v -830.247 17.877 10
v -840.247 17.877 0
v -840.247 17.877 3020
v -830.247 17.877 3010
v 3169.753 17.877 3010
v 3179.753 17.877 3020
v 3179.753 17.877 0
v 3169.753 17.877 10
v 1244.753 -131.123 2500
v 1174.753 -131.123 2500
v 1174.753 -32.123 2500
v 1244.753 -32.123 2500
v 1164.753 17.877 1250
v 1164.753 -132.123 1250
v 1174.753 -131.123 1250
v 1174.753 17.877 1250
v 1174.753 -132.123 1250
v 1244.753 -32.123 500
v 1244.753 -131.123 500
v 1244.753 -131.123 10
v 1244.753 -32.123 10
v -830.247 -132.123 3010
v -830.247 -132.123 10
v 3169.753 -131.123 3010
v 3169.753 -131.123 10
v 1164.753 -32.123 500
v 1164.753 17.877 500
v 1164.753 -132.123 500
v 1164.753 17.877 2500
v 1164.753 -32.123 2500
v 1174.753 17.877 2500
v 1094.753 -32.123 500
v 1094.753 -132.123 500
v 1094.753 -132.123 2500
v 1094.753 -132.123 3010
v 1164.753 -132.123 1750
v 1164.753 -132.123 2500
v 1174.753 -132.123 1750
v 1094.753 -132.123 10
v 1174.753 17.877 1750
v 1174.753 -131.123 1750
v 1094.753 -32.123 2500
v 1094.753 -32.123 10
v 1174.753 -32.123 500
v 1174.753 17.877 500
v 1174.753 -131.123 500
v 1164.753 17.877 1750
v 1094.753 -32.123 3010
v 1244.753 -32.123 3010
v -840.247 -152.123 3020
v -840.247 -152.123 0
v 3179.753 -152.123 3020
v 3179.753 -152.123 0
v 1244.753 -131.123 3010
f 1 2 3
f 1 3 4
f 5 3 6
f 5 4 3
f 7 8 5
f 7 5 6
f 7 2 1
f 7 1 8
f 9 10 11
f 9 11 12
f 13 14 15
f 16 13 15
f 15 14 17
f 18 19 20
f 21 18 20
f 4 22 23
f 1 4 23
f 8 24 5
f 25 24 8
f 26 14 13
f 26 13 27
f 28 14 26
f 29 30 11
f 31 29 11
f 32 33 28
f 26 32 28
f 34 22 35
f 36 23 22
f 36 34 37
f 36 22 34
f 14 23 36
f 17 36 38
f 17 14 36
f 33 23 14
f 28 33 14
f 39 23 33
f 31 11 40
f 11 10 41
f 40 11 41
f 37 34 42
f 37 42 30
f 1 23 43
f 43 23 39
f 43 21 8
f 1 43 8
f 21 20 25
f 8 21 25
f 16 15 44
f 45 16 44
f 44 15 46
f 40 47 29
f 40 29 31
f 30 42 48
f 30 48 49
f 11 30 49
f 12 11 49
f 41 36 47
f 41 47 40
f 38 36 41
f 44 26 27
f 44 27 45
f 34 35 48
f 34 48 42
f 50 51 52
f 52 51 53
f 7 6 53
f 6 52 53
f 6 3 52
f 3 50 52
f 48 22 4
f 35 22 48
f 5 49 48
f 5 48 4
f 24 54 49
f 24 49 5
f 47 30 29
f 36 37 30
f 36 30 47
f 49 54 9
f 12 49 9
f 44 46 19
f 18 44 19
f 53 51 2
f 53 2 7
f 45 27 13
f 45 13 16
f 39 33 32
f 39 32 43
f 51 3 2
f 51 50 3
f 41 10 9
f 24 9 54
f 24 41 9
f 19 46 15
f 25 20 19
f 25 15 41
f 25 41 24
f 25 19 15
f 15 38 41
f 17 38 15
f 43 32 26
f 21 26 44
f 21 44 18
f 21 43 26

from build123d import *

# Parameters (mm, degrees)
ESBO_O1_W                = 4020
ESBO_O1_H                = 20
RESSALTO_EXTRUS_O1_DEPTH = 3020
ESBO_O2_W                = 4020
ESBO_O2_H                = 3020
ESBO_O2_W_2              = 4000
ESBO_O2_H_2              = 3000
ESBO_O2_W_3              = 10
ESBO_O2_H_3              = 750
RESSALTO_EXTRUS_O2_DEPTH = 150
ESBO_O3_W                = 150
ESBO_O3_H                = 490
ESBO_O3_H_2              = 510
RESSALTO_EXTRUS_O3_DEPTH = 100
ESBO_O4_W                = 1995
ESBO_O4_H                = 3000
RESSALTO_EXTRUS_O4_DEPTH = 1


with BuildPart() as part:
    # Esboço1 → Ressalto-extrusão1 (new body)
    with BuildSketch(Plane.XY):
        with Locations((1169.753435213, -142.12327558)):
            Rectangle(ESBO_O1_W, ESBO_O1_H)
    extrude(amount=RESSALTO_EXTRUS_O1_DEPTH)

    # Esboço2 → Ressalto-extrusão2 (add)
    with BuildSketch(Plane(origin=(0, -132.12327558, 0), x_dir=(1, 0, 0), z_dir=(0, 1, 0))):
        with Locations((1169.753435213, -1510)):
            Rectangle(ESBO_O2_W, ESBO_O2_H)
        with Locations((1169.753435213, -1510)):
            Rectangle(ESBO_O2_W_2, ESBO_O2_H_2, mode=Mode.SUBTRACT)
        with Locations((1169.753435213, -875)):
            Rectangle(ESBO_O2_W_3, ESBO_O2_H_3)
        with Locations((1169.753435213, -2125)):
            Rectangle(ESBO_O2_W_3, ESBO_O2_H_3)
    extrude(amount=RESSALTO_EXTRUS_O2_DEPTH)

    # Esboço3 → Ressalto-extrusão3 (add)
    with BuildSketch(Plane(origin=(0, -132.12327558, 0), x_dir=(1, 0, 0), z_dir=(0, 1, 0))):
        with Locations((1169.753435213, -255)):
            Rectangle(ESBO_O3_W, ESBO_O3_H)
        with Locations((1169.753435213, -2755)):
            Rectangle(ESBO_O3_W, ESBO_O3_H_2)
    extrude(amount=RESSALTO_EXTRUS_O3_DEPTH)

    # Esboço4 → Ressalto-extrusão4 (add)
    with BuildSketch(Plane(origin=(0, -132.12327558, 0), x_dir=(1, 0, 0), z_dir=(0, 1, 0))):
        with Locations((2172.253435213, -1510)):
            Rectangle(ESBO_O4_W, ESBO_O4_H)
    extrude(amount=RESSALTO_EXTRUS_O4_DEPTH)


solid = part.part
